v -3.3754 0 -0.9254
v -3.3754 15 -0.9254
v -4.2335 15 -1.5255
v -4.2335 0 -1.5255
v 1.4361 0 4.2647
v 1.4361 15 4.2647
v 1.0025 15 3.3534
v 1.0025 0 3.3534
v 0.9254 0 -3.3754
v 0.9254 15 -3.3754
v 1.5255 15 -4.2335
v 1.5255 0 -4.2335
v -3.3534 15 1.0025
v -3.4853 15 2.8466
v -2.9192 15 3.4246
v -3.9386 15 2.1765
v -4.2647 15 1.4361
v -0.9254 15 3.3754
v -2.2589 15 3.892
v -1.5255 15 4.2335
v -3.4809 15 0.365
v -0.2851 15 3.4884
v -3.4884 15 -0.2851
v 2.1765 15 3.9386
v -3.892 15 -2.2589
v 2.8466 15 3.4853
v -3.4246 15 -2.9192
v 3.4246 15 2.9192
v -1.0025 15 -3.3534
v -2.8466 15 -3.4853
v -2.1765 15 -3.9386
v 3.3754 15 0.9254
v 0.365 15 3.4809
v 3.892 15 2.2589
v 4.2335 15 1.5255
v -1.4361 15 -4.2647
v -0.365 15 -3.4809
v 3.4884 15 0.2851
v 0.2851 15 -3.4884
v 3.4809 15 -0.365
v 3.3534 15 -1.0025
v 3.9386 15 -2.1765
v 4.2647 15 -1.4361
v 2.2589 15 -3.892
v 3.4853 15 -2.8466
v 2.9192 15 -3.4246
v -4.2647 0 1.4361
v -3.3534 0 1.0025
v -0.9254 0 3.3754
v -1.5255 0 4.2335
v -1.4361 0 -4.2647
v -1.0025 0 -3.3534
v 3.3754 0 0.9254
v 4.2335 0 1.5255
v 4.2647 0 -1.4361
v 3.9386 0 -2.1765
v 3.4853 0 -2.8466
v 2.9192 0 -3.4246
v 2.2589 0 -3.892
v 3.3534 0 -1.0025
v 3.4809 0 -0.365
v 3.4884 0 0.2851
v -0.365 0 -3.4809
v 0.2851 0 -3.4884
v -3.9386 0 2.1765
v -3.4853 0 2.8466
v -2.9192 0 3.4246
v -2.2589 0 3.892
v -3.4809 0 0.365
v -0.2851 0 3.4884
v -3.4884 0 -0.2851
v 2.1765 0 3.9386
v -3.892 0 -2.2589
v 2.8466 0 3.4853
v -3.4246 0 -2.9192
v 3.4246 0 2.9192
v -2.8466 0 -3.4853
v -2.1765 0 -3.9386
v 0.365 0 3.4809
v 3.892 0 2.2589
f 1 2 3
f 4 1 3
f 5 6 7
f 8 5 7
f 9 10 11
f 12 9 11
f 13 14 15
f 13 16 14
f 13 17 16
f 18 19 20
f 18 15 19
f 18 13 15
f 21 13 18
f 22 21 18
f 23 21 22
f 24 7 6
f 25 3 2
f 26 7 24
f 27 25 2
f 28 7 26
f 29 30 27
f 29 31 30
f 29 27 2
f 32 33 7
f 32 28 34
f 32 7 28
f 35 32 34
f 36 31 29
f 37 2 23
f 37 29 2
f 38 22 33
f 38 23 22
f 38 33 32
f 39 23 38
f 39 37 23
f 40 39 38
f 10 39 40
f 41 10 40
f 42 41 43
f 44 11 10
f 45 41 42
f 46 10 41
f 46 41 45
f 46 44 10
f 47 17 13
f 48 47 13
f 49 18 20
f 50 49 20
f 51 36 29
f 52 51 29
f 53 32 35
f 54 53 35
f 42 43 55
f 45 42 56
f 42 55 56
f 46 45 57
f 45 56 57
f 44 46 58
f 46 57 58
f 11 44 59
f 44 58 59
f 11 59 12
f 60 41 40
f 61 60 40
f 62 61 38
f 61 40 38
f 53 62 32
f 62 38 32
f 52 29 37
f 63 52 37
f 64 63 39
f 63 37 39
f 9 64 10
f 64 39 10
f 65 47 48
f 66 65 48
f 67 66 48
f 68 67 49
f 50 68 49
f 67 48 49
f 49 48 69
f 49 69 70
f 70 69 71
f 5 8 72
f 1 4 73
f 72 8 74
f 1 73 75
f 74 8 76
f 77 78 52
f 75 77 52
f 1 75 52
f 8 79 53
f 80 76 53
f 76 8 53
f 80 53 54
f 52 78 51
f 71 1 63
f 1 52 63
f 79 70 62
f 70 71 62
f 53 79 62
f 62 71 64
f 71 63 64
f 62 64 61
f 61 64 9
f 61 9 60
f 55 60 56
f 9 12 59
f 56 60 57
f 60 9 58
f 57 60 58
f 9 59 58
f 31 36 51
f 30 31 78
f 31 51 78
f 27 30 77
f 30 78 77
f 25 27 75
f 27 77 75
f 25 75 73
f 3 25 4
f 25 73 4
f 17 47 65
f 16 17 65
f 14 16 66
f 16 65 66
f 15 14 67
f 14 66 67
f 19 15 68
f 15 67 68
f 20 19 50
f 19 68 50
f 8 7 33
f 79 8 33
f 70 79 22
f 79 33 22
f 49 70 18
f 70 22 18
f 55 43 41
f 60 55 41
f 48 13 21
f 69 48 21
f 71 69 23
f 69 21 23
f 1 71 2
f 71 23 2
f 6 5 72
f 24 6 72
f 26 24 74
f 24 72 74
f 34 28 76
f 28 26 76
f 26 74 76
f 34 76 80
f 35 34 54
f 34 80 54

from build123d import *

# Parameters (mm, degrees)
SKETCH1_R           = 4.5
BOSS_EXTRUDE1_DEPTH = 15
CUT_EXTRUDE1_DEPTH  = 15
CIRPATTERN1_COUNT   = 4


with BuildPart() as part:
    # Sketch1 → Boss-Extrude1 (new body)
    with BuildSketch(Plane(origin=(0, 0, 0), x_dir=(1, 0, 0), z_dir=(0, 1, 0))):
        Circle(SKETCH1_R)
    extrude(amount=BOSS_EXTRUDE1_DEPTH)

    # Sketch2 → Cut-Extrude1 (cut)
    with BuildSketch(Plane(origin=(0, 15, 0), x_dir=(1, 0, 0), z_dir=(0, 1, 0))):
        with BuildLine():
            Line((-1.436091353, 4.264697132), (-1.002466053, 3.353365744))
            ThreePointArc((-1.002466053, 3.353365744), (-0.040083536, 3.499770465), (0.925399693, 3.375445957))
            Line((0.925399693, 3.375445957), (1.52547781, 4.233546675))
            ThreePointArc((1.52547781, 4.233546675), (0.047329403, 4.499751096), (-1.436091353, 4.264697132))
        make_face()
    cut_extrude1 = extrude(amount=-CUT_EXTRUDE1_DEPTH, mode=Mode.SUBTRACT)

    # CirPattern1: Cut-Extrude1 ×4 about axis
    cirpattern1_axis = Axis((0, 0, 0), (0, 1, 0))
    for i in range(1, CIRPATTERN1_COUNT):
        add(cut_extrude1.rotate(cirpattern1_axis, i * 360 / CIRPATTERN1_COUNT), mode=Mode.SUBTRACT)


solid = part.part
